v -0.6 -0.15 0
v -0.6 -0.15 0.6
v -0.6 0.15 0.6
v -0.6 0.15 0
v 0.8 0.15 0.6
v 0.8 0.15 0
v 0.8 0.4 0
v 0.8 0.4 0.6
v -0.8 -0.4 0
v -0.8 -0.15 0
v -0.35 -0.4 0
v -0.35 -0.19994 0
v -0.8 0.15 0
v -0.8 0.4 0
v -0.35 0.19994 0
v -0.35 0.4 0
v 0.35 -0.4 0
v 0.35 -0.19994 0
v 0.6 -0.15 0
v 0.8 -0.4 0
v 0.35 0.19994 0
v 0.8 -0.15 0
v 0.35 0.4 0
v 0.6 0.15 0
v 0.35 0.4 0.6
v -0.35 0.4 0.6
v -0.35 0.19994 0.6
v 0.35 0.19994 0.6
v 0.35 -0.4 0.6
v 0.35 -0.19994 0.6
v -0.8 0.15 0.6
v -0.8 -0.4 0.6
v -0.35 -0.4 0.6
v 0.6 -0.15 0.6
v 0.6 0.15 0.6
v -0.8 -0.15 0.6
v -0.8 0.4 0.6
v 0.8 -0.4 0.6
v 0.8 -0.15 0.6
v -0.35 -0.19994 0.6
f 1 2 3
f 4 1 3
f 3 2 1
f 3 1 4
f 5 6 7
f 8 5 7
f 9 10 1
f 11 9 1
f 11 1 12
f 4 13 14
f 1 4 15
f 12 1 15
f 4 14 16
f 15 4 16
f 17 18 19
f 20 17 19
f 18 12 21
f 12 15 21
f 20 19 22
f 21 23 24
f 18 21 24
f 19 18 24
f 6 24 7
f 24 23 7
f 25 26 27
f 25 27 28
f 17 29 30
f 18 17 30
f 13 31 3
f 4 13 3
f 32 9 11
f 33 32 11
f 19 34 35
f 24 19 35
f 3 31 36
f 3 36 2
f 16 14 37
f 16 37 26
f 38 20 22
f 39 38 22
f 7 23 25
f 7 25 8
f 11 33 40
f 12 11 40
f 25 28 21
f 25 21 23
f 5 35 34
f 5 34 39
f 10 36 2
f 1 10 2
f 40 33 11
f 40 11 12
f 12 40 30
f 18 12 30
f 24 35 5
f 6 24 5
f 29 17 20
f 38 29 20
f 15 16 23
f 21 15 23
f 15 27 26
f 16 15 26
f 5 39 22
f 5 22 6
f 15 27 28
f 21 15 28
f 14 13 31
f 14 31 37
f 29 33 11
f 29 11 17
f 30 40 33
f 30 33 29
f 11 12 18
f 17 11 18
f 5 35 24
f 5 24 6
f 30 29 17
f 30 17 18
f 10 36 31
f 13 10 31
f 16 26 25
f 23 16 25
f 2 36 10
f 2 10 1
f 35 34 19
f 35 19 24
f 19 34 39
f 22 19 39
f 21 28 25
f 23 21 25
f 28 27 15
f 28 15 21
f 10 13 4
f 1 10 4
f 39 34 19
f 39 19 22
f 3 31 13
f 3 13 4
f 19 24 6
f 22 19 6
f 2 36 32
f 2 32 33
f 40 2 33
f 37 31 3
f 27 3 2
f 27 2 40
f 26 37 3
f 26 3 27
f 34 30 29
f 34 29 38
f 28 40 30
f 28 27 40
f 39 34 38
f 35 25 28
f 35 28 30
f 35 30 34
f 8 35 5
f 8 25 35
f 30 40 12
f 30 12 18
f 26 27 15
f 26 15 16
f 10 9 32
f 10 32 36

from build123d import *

# Parameters (mm, degrees)
SKETCH1_W             = 1.6
SKETCH1_H             = 0.8
BOSS_EXTRUDE1_DEPTH   = 0.6
SKETCH2_W             = 0.7
SKETCH2_H             = 0.200058326
SKETCH2_W_2           = 0.2
SKETCH2_H_2           = 0.3
CUT_EXTRUDE1_DEPTH    = 0.6
SKETCH2_4_W           = 0.7
SKETCH2_4_H           = 0.200058326
BOSS_EXTRUDE2_DEPTH   = 0.6
SKETCH2_4_W_2         = 0.2
SKETCH2_4_H_2         = 0.3
BOSS_EXTRUDE2_2_DEPTH = 0.6
BOSS_EXTRUDE2_3_DEPTH = 0.6
BOSS_EXTRUDE2_4_DEPTH = 0.6


with BuildPart() as part:
    # Sketch1 → Boss-Extrude1 (new body)
    with BuildSketch(Plane.XY):
        Rectangle(SKETCH1_W, SKETCH1_H)
    extrude(amount=BOSS_EXTRUDE1_DEPTH)

    # Sketch2 → Cut-Extrude1 (cut)
    with BuildSketch(Plane.XY.offset(0.6)):
        with Locations((0, -0.299970837)):
            Rectangle(SKETCH2_W, SKETCH2_H)
        with Locations((-0.7, 0)):
            Rectangle(SKETCH2_W_2, SKETCH2_H_2)
        with Locations((0, 0.299970837)):
            Rectangle(SKETCH2_W, SKETCH2_H)
        with Locations((0.7, 0)):
            Rectangle(SKETCH2_W_2, SKETCH2_H_2)
    extrude(amount=-CUT_EXTRUDE1_DEPTH, mode=Mode.SUBTRACT)


with BuildPart() as body_2:
    # Sketch2<4> → Boss-Extrude2 (new body)
    with BuildSketch(Plane.XY.offset(0.6)):
        with Locations((0, -0.299970837)):
            Rectangle(SKETCH2_4_W, SKETCH2_4_H)
    extrude(amount=-BOSS_EXTRUDE2_DEPTH)


with BuildPart() as body_3:
    # Sketch2<4> → Boss-Extrude2 2 (new body)
    with BuildSketch(Plane.XY.offset(0.6)):
        with Locations((-0.7, 0)):
            Rectangle(SKETCH2_4_W_2, SKETCH2_4_H_2)
    extrude(amount=-BOSS_EXTRUDE2_2_DEPTH)


with BuildPart() as body_4:
    # Sketch2<4> → Boss-Extrude2 3 (new body)
    with BuildSketch(Plane.XY.offset(0.6)):
        with Locations((0, 0.299970837)):
            Rectangle(SKETCH2_4_W, SKETCH2_4_H)
    extrude(amount=-BOSS_EXTRUDE2_3_DEPTH)


with BuildPart() as body_5:
    # Sketch2<4> → Boss-Extrude2 4 (new body)
    with BuildSketch(Plane.XY.offset(0.6)):
        with Locations((0.7, 0)):
            Rectangle(SKETCH2_4_W_2, SKETCH2_4_H_2)
    extrude(amount=-BOSS_EXTRUDE2_4_DEPTH)


solid = Compound([part.part, body_2.part, body_3.part, body_4.part, body_5.part])
